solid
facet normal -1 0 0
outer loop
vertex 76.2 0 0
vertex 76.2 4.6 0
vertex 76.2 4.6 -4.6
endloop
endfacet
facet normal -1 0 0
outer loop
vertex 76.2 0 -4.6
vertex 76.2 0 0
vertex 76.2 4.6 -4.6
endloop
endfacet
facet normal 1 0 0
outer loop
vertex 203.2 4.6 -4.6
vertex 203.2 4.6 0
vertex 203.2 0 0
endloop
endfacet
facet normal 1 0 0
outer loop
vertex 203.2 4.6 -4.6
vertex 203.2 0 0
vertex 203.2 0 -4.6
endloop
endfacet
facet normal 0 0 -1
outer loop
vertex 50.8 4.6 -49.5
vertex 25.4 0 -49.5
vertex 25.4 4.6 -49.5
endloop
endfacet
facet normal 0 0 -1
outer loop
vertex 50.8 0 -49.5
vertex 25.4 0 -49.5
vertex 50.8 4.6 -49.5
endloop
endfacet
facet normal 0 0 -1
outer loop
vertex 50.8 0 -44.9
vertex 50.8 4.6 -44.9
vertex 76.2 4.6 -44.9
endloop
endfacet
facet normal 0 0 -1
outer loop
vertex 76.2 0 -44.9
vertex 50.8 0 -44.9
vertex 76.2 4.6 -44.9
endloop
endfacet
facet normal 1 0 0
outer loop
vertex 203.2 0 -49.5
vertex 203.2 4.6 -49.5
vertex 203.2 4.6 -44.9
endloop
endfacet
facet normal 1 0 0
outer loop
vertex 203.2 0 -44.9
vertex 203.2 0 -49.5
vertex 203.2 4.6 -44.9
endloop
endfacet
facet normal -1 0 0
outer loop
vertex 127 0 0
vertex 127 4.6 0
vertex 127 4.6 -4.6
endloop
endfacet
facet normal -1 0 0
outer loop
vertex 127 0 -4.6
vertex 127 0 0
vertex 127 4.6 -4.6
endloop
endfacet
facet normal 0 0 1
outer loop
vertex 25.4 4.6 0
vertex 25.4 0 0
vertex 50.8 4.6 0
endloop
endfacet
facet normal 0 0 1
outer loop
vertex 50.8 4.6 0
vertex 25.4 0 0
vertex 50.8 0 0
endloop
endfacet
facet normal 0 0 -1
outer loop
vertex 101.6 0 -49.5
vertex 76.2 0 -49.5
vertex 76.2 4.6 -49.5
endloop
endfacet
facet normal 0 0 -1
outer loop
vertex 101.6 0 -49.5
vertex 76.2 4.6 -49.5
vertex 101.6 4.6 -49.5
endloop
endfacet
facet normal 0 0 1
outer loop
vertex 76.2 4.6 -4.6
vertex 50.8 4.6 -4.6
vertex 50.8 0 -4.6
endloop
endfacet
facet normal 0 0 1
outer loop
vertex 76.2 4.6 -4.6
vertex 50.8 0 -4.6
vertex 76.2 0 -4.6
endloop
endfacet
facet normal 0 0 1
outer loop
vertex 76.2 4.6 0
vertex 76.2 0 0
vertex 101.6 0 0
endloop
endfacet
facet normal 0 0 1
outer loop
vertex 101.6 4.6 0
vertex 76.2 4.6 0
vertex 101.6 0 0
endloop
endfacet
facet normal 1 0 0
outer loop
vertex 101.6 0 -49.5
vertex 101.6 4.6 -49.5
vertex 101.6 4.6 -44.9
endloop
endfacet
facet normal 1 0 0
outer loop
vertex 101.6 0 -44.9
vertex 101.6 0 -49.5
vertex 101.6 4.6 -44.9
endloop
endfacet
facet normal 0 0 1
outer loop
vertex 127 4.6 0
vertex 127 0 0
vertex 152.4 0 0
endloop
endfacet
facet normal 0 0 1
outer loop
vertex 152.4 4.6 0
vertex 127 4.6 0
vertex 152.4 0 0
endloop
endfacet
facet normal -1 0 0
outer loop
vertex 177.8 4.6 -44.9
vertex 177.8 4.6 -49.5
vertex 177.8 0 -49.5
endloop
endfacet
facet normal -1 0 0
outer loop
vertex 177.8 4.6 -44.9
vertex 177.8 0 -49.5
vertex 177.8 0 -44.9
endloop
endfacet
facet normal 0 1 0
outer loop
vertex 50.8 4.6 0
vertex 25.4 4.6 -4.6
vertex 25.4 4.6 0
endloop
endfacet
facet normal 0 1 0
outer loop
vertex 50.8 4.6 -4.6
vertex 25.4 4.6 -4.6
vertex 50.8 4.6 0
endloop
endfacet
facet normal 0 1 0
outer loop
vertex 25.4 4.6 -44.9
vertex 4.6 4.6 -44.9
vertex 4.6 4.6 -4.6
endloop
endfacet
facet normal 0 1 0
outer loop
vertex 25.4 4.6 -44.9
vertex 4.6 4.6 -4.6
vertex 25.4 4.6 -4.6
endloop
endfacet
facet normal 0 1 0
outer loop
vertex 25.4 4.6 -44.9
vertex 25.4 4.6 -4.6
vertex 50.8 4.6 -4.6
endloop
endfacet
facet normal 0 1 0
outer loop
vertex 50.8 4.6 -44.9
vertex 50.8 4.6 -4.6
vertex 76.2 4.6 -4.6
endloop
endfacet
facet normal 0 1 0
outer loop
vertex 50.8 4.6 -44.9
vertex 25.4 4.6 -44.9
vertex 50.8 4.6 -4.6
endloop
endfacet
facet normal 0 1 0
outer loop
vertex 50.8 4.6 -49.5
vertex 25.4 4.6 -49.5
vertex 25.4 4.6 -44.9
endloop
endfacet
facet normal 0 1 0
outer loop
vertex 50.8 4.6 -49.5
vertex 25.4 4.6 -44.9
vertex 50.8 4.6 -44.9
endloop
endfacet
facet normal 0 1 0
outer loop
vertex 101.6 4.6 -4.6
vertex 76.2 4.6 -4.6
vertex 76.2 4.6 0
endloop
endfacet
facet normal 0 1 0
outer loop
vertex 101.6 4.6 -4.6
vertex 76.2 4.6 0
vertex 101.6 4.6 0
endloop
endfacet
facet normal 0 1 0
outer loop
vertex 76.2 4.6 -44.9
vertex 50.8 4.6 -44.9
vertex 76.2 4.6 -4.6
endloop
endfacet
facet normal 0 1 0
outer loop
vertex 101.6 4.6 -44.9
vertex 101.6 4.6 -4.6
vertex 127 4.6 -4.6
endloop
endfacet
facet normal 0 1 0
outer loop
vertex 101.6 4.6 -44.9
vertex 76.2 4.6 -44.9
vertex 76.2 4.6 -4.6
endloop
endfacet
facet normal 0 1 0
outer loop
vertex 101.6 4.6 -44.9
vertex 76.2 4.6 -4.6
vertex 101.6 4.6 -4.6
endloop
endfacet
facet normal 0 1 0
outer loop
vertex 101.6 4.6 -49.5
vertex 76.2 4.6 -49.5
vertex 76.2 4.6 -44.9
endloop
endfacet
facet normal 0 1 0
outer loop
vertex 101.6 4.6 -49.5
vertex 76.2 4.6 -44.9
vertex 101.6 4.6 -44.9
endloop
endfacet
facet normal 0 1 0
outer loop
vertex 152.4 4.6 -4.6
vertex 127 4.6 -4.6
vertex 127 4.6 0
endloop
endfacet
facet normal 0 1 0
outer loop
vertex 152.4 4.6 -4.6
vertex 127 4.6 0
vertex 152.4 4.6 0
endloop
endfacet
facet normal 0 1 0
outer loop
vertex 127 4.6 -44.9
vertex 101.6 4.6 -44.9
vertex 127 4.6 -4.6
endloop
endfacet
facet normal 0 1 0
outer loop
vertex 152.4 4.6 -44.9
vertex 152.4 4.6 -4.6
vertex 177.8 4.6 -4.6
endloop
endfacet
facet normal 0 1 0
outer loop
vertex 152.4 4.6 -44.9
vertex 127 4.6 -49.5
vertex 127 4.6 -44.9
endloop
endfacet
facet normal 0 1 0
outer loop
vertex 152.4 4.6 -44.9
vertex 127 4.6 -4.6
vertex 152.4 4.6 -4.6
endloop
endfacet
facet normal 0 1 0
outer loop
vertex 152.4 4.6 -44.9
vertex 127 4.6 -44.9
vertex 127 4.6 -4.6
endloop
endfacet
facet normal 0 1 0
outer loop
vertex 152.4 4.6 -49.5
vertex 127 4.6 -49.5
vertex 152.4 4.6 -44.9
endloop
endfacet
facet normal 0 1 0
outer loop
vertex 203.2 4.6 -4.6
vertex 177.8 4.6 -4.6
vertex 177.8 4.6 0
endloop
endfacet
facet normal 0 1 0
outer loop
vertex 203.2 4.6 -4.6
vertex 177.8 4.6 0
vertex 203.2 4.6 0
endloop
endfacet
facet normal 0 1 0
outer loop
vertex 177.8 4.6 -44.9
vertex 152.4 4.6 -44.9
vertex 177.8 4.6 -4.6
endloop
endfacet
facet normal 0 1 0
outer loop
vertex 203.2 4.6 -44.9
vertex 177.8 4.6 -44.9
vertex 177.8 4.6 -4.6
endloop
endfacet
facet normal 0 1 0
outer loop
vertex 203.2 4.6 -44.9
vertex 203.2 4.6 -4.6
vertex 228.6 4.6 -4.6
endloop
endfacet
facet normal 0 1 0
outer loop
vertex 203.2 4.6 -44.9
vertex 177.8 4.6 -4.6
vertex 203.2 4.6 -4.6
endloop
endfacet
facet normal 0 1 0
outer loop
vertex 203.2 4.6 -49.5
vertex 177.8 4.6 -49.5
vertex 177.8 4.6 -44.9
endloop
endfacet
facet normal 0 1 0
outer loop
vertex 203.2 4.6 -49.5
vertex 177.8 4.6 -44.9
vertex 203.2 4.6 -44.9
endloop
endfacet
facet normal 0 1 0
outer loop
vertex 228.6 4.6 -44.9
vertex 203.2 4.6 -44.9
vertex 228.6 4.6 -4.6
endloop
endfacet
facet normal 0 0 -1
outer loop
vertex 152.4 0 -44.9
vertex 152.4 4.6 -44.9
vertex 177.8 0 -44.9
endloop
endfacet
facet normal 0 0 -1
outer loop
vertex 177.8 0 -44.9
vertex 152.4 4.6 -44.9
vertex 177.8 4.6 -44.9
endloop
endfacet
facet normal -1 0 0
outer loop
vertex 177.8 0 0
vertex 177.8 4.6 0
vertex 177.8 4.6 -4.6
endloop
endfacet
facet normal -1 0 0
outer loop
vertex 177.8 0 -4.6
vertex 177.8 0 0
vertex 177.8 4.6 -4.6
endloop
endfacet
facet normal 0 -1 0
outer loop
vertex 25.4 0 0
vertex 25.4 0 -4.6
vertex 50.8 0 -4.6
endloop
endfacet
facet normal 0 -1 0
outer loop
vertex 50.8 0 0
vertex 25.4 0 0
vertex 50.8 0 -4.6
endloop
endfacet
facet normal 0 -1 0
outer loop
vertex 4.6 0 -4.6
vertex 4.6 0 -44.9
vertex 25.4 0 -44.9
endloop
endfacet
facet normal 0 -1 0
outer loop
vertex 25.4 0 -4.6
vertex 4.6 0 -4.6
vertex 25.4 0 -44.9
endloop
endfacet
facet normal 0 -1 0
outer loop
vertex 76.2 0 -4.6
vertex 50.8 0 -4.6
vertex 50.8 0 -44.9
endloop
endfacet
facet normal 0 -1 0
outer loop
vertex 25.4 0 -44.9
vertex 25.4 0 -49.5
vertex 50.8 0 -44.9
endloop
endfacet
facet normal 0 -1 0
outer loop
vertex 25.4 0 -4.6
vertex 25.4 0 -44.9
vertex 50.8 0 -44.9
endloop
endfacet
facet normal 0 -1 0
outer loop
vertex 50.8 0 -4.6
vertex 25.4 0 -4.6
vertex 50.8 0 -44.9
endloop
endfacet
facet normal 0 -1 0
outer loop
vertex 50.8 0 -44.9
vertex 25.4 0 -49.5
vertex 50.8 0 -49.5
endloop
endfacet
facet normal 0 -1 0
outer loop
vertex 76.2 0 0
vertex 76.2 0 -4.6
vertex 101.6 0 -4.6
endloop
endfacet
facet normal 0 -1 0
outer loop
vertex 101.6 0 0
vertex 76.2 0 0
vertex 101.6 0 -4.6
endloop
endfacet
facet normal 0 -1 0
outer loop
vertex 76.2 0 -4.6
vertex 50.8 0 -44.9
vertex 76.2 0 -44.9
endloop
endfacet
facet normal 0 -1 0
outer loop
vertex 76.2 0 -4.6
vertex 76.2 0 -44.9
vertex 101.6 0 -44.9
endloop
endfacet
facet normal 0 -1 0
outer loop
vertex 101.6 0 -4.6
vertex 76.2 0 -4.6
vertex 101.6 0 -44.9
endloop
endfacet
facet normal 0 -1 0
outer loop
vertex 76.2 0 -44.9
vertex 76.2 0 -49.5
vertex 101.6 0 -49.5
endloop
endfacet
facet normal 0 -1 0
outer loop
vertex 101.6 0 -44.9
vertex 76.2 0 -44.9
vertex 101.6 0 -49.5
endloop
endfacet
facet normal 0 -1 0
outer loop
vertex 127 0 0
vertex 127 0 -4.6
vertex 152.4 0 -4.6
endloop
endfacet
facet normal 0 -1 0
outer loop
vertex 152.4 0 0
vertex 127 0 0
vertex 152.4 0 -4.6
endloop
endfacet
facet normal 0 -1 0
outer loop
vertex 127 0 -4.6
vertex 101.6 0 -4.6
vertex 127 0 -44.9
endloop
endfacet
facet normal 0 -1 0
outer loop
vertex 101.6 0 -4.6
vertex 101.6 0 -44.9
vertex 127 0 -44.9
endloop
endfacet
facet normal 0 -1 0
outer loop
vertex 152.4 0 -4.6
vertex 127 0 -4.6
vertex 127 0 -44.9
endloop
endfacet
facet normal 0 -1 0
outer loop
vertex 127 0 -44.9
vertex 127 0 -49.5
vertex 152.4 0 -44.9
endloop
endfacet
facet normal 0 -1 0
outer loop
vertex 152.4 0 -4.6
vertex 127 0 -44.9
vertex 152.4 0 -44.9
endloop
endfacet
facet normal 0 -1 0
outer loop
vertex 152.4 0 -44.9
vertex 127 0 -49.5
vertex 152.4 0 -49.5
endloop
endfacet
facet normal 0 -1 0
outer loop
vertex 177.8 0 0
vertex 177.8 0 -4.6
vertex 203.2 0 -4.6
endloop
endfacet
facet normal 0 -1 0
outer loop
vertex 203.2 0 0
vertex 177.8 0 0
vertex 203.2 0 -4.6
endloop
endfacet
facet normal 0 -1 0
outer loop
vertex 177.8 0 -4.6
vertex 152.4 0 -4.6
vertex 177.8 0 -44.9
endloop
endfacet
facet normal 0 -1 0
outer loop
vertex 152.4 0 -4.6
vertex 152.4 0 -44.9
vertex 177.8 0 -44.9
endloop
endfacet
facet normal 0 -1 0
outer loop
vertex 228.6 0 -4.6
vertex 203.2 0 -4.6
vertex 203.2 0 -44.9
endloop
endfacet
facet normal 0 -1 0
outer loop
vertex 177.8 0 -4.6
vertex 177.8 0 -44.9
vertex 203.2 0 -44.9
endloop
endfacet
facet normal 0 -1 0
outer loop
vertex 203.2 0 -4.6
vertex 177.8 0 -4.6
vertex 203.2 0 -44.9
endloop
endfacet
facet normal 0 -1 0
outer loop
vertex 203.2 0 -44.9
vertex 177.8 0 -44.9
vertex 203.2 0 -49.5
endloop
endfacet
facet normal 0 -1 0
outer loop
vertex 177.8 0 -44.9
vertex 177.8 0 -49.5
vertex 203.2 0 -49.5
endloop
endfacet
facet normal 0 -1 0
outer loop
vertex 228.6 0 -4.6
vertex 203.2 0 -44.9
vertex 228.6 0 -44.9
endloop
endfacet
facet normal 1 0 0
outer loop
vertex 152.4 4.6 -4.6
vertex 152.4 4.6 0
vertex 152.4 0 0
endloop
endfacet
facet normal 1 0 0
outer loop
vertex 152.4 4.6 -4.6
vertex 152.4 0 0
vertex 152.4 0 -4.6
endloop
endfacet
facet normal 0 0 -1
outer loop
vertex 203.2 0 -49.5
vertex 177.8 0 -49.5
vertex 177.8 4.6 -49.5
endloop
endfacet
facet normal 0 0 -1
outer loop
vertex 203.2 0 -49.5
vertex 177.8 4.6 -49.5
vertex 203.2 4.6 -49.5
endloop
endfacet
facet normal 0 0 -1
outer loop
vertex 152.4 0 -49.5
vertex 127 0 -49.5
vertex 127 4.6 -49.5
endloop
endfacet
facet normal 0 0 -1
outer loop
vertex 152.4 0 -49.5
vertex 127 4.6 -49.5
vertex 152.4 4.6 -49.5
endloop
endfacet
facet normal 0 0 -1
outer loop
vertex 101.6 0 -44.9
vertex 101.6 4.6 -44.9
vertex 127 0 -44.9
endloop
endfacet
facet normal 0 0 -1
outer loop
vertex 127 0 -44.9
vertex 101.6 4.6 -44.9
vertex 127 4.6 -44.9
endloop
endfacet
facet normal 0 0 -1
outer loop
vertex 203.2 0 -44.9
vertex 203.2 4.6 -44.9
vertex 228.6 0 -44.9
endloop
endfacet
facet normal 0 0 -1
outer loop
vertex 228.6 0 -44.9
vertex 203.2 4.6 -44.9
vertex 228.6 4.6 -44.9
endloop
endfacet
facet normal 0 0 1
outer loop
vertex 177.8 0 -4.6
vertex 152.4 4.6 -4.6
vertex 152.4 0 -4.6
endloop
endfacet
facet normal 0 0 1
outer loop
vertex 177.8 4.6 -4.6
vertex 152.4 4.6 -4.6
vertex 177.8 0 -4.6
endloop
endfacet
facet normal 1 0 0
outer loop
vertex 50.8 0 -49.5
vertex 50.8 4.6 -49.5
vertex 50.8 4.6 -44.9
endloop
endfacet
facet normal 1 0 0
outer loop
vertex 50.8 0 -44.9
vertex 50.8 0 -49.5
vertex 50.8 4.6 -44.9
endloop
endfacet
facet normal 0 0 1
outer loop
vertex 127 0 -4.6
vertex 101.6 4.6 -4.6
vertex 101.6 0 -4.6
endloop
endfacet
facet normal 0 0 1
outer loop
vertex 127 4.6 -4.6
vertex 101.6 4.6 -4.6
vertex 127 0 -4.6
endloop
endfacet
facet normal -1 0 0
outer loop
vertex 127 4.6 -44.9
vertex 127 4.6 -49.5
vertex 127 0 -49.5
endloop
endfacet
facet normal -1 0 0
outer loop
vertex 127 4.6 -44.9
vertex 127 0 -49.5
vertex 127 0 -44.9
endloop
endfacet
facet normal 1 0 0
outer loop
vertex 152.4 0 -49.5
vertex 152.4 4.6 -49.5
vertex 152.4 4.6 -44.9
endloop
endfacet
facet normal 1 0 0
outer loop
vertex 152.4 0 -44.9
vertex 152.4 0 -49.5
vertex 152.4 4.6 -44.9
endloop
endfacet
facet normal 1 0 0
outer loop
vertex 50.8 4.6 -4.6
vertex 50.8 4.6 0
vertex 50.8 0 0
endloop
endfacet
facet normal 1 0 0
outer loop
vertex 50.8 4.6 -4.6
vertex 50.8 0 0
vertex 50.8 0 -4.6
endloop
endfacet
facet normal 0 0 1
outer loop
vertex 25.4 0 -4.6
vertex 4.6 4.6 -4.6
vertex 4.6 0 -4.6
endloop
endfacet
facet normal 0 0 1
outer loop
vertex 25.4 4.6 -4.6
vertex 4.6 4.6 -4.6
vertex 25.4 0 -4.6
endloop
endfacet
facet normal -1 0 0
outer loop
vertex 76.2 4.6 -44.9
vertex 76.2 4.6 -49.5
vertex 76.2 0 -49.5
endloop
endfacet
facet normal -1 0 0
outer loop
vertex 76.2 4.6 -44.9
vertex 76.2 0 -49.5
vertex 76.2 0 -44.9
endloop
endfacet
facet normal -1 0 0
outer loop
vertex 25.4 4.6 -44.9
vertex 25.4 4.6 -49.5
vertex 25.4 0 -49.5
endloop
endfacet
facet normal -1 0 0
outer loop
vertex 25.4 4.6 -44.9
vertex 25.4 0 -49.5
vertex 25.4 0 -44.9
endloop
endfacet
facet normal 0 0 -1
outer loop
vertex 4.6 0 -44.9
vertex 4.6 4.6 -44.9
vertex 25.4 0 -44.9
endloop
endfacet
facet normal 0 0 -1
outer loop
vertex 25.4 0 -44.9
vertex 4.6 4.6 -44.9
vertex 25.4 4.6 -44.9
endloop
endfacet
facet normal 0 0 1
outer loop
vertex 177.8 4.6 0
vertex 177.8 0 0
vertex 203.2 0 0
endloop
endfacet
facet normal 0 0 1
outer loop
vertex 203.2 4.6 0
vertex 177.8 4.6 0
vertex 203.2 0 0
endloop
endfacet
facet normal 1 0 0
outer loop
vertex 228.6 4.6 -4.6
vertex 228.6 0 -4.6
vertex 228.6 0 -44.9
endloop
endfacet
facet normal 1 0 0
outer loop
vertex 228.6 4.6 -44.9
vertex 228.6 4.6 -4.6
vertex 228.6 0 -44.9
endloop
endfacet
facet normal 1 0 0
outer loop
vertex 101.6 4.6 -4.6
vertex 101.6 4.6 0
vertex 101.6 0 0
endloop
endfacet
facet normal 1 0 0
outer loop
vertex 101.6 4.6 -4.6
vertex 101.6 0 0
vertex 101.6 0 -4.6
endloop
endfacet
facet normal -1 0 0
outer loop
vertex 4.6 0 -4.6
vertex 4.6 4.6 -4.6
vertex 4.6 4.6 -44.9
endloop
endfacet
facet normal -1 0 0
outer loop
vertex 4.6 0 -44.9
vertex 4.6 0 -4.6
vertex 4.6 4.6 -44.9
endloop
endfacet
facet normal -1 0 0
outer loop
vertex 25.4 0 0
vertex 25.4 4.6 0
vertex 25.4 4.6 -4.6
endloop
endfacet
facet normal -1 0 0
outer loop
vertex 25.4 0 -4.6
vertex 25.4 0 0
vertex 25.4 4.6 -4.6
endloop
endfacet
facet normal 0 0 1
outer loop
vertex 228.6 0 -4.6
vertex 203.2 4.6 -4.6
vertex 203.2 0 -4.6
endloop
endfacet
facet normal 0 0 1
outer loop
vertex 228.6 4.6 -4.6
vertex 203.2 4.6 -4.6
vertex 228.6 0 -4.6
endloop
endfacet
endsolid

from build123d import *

# Parameters (mm, degrees)
SKETCH1_W           = 228.6
SKETCH1_H           = 49.499999806
BOSS_EXTRUDE1_DEPTH = 4.599999944
SKETCH3_W           = 25.4
SKETCH3_H           = 4.599999944
CUT_EXTRUDE1_DEPTH  = 234.943091328
SKETCH4_W           = 4.599999944
SKETCH4_H           = 40.299999918
CUT_EXTRUDE2_DEPTH  = 234.943091328


with BuildPart() as part:
    # Sketch1 → Boss-Extrude1 (new body)
    with BuildSketch(Plane(origin=(0, 0, 0), x_dir=(1, 0, 0), z_dir=(0, 1, 0))):
        with Locations((114.3, 24.749999903)):
            Rectangle(SKETCH1_W, SKETCH1_H)
    extrude(amount=BOSS_EXTRUDE1_DEPTH)

    # Sketch3 → Cut-Extrude1 (cut, through all)
    with BuildSketch(Plane(origin=(0, 4.599999944, 0), x_dir=(1, 0, 0), z_dir=(0, 1, 0))):
        with Locations((12.7, 2.299999972)):
            Rectangle(SKETCH3_W, SKETCH3_H)
        with Locations((63.5, 2.299999972)):
            Rectangle(SKETCH3_W, SKETCH3_H)
        with Locations((114.3, 2.299999972)):
            Rectangle(SKETCH3_W, SKETCH3_H)
        with Locations((165.1, 2.299999972)):
            Rectangle(SKETCH3_W, SKETCH3_H)
        with Locations((215.9, 2.299999972)):
            Rectangle(SKETCH3_W, SKETCH3_H)
    cut_extrude1 = extrude(amount=-CUT_EXTRUDE1_DEPTH, mode=Mode.SUBTRACT)

    # Mirror1: Cut-Extrude1 across plane
    add(cut_extrude1.mirror(Plane(origin=(0, 0, -24.749999903), x_dir=(1, 0, 0), z_dir=(0, 0, -1))), mode=Mode.SUBTRACT)

    # Sketch4 → Cut-Extrude2 (cut, through all)
    with BuildSketch(Plane(origin=(0, 4.599999944, 0), x_dir=(1, 0, 0), z_dir=(0, 1, 0))):
        with Locations((2.299999972, 24.749999903)):
            Rectangle(SKETCH4_W, SKETCH4_H)
    extrude(amount=-CUT_EXTRUDE2_DEPTH, mode=Mode.SUBTRACT)


solid = part.part
